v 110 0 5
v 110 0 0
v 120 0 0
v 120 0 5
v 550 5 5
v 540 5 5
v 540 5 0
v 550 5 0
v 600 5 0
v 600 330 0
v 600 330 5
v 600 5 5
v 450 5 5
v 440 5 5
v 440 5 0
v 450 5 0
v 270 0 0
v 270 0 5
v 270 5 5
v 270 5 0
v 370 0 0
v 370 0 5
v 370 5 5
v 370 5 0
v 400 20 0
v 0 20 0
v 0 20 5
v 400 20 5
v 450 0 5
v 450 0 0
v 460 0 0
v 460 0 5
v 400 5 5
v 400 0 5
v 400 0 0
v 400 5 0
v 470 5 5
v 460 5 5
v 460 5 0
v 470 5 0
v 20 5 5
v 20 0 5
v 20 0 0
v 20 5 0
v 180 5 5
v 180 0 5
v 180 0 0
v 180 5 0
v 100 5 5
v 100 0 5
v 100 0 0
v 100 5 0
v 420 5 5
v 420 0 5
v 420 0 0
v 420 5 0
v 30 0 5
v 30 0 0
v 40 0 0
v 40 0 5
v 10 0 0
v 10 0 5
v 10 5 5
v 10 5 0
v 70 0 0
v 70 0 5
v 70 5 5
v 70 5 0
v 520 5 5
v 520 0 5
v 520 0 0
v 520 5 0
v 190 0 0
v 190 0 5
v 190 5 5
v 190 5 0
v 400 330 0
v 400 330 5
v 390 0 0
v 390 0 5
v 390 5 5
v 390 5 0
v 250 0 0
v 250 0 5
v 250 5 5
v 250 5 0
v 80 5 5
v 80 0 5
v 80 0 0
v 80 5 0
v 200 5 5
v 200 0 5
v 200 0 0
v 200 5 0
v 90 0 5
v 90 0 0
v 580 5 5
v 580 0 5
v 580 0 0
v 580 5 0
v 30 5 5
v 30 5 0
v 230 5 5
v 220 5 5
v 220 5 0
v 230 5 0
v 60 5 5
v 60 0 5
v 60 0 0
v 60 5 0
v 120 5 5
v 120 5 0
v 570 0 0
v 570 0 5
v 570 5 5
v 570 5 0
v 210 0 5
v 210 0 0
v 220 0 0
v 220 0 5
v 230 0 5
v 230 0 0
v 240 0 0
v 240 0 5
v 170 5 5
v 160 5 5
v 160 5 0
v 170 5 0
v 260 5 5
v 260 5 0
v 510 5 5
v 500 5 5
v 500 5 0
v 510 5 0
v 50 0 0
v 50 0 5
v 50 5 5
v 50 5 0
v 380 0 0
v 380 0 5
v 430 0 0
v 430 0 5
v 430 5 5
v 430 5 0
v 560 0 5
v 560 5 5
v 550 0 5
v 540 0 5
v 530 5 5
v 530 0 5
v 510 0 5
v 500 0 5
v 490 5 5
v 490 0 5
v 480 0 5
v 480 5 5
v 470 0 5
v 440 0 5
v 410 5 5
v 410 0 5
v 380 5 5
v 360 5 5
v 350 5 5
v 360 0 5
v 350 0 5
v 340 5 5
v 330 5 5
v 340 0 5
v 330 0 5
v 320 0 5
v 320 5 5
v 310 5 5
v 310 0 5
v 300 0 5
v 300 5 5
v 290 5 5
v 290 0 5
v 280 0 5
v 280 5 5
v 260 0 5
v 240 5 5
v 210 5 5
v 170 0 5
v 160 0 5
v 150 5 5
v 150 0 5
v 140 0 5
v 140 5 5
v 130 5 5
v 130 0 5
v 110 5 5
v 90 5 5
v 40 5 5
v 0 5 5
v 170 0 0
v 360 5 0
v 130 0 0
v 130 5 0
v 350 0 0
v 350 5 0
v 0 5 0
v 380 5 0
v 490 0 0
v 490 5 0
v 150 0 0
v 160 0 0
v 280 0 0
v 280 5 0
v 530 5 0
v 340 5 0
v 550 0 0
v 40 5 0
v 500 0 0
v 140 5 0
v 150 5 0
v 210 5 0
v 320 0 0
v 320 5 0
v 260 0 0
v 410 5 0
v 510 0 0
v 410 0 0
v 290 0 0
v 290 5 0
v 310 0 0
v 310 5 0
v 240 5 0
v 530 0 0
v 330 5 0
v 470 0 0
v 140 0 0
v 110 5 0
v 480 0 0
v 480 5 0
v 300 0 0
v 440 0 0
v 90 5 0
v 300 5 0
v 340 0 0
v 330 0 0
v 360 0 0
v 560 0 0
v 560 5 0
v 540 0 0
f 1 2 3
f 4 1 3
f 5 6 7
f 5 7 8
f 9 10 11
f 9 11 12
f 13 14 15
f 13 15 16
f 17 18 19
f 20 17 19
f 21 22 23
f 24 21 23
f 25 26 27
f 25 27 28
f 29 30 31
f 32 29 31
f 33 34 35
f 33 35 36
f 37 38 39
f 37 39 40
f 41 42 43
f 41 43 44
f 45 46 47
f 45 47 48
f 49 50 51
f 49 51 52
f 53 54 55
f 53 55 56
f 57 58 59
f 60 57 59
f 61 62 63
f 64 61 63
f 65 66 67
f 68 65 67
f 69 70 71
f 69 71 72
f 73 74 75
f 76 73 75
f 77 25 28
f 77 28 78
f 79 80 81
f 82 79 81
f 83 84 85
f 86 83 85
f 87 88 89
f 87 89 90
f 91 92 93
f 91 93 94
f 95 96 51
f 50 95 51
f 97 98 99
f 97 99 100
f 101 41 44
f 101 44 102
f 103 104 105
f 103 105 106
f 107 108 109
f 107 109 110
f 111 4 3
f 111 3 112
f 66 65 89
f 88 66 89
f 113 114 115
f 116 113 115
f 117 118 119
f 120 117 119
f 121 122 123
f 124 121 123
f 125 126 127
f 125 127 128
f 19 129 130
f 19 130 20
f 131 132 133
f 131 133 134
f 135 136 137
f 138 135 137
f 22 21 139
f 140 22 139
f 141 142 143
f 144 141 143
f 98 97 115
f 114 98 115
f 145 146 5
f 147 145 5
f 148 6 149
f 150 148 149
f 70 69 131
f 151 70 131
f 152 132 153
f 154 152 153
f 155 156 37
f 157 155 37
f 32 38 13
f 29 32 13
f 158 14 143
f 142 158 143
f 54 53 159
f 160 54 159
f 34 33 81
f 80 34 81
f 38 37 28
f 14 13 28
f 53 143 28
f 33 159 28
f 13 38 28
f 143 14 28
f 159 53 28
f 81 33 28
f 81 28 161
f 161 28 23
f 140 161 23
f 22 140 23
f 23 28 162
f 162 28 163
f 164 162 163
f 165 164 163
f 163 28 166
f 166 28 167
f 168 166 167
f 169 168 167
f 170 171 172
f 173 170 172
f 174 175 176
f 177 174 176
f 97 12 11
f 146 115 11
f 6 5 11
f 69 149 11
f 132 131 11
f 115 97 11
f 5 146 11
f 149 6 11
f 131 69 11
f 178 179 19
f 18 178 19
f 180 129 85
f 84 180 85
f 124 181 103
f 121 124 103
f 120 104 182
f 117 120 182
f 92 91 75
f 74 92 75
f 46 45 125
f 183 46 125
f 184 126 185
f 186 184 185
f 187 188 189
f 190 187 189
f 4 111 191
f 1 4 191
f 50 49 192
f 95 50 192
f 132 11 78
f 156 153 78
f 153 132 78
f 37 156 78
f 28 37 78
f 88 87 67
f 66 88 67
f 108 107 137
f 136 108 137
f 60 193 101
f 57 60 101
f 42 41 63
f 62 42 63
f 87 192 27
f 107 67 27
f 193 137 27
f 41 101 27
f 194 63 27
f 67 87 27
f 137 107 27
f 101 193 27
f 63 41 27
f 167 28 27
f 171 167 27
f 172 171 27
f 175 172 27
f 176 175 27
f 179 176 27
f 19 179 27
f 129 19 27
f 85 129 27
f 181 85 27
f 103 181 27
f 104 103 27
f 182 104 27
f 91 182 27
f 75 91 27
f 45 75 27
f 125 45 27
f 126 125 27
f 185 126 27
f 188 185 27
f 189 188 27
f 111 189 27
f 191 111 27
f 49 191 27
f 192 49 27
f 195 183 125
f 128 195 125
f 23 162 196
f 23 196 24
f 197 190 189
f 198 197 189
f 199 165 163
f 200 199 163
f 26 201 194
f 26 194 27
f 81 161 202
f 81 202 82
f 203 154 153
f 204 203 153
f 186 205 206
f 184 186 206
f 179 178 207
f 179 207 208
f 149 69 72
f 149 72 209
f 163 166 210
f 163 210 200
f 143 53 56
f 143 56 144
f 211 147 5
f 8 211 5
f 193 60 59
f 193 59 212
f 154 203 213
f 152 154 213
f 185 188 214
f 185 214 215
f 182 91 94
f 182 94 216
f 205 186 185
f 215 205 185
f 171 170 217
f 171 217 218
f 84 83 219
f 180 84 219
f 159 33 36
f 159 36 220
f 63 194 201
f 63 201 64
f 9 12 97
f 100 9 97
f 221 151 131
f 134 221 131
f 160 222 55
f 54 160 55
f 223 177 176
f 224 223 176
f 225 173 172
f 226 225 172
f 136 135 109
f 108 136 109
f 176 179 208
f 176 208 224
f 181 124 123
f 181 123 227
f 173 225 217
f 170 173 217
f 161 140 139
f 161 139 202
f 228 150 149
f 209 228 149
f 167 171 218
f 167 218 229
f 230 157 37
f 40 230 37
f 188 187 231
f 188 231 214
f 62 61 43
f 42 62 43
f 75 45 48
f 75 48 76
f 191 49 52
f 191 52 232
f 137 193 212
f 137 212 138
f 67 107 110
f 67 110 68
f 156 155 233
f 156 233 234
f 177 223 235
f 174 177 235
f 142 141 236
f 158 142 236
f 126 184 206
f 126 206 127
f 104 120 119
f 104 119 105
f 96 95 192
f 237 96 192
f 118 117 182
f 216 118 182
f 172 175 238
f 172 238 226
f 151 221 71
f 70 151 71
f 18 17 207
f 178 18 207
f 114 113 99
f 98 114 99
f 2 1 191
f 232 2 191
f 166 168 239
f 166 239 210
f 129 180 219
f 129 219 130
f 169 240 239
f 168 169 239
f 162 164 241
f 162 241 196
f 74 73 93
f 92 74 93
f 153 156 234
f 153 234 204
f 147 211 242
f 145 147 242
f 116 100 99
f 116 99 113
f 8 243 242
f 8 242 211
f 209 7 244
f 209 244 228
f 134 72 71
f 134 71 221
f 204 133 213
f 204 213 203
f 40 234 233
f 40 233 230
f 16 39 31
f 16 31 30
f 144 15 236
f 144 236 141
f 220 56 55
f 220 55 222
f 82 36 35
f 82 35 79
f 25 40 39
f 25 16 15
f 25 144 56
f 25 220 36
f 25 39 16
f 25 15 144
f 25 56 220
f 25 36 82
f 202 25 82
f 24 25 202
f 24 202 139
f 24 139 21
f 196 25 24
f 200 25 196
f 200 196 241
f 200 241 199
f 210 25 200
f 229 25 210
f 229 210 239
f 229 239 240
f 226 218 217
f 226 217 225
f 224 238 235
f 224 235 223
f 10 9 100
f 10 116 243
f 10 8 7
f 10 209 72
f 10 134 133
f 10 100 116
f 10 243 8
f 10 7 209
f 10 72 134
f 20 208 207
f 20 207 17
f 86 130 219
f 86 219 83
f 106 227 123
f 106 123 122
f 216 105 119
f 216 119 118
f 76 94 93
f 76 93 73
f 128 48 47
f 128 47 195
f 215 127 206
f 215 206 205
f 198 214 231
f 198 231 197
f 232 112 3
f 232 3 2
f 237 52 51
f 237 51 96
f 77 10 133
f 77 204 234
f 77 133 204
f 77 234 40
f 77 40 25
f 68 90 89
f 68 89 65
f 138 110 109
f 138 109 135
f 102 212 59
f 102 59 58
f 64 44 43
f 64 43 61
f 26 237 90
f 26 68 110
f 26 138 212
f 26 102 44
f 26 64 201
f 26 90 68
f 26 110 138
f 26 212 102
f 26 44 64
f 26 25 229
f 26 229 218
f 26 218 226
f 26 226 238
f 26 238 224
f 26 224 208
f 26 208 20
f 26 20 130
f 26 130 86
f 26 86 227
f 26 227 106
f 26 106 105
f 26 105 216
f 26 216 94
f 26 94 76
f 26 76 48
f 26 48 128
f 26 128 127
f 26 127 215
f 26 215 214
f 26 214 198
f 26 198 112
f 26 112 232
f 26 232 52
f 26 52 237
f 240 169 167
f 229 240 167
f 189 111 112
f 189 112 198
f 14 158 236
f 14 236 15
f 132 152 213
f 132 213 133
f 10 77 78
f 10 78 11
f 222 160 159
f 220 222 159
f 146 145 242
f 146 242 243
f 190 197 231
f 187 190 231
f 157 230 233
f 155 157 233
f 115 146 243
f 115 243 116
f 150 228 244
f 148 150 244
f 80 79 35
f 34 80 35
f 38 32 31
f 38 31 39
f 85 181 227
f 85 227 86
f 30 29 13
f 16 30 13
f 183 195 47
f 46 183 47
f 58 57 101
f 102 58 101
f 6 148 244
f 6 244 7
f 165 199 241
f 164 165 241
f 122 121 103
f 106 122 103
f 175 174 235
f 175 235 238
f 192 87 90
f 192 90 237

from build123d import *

# Parameters (mm, degrees)
BOSS_EXTRU_1_DEPTH      = 5
ESQUISSE2_W             = 10
ESQUISSE2_H             = 5
ENL_V_MAT_EXTRU_2_DEPTH = 685.780986886


with BuildPart() as part:
    # Esquisse1 → Boss.-Extru.1 (new body)
    with BuildSketch(Plane.XY):
        Polygon((400, 20), (400, 330), (600, 330), (600, 0), (400, 0), (0, 0), (0, 20), align=None)
    extrude(amount=BOSS_EXTRU_1_DEPTH)

    # Esquisse2 → Enlèv. mat.-Extru.2 (cut, through all)
    with BuildSketch(Plane.XY.offset(5)):
        with Locations((25, 2.5)):
            Rectangle(ESQUISSE2_W, ESQUISSE2_H)
        with Locations((5, 2.5)):
            Rectangle(ESQUISSE2_W, ESQUISSE2_H)
        with Locations((45, 2.5)):
            Rectangle(ESQUISSE2_W, ESQUISSE2_H)
        with Locations((65, 2.5)):
            Rectangle(ESQUISSE2_W, ESQUISSE2_H)
        with Locations((85, 2.5)):
            Rectangle(ESQUISSE2_W, ESQUISSE2_H)
        with Locations((105, 2.5)):
            Rectangle(ESQUISSE2_W, ESQUISSE2_H)
        with Locations((125, 2.5)):
            Rectangle(ESQUISSE2_W, ESQUISSE2_H)
        with Locations((145, 2.5)):
            Rectangle(ESQUISSE2_W, ESQUISSE2_H)
        with Locations((165, 2.5)):
            Rectangle(ESQUISSE2_W, ESQUISSE2_H)
        with Locations((185, 2.5)):
            Rectangle(ESQUISSE2_W, ESQUISSE2_H)
        with Locations((205, 2.5)):
            Rectangle(ESQUISSE2_W, ESQUISSE2_H)
        with Locations((225, 2.5)):
            Rectangle(ESQUISSE2_W, ESQUISSE2_H)
        with Locations((245, 2.5)):
            Rectangle(ESQUISSE2_W, ESQUISSE2_H)
        with Locations((265, 2.5)):
            Rectangle(ESQUISSE2_W, ESQUISSE2_H)
        with Locations((285, 2.5)):
            Rectangle(ESQUISSE2_W, ESQUISSE2_H)
        with Locations((305, 2.5)):
            Rectangle(ESQUISSE2_W, ESQUISSE2_H)
        with Locations((325, 2.5)):
            Rectangle(ESQUISSE2_W, ESQUISSE2_H)
        with Locations((345, 2.5)):
            Rectangle(ESQUISSE2_W, ESQUISSE2_H)
        with Locations((365, 2.5)):
            Rectangle(ESQUISSE2_W, ESQUISSE2_H)
        with Locations((385, 2.5)):
            Rectangle(ESQUISSE2_W, ESQUISSE2_H)
        with Locations((405, 2.5)):
            Rectangle(ESQUISSE2_W, ESQUISSE2_H)
        with Locations((425, 2.5)):
            Rectangle(ESQUISSE2_W, ESQUISSE2_H)
        with Locations((445, 2.5)):
            Rectangle(ESQUISSE2_W, ESQUISSE2_H)
        with Locations((465, 2.5)):
            Rectangle(ESQUISSE2_W, ESQUISSE2_H)
        with Locations((485, 2.5)):
            Rectangle(ESQUISSE2_W, ESQUISSE2_H)
        with Locations((505, 2.5)):
            Rectangle(ESQUISSE2_W, ESQUISSE2_H)
        with Locations((525, 2.5)):
            Rectangle(ESQUISSE2_W, ESQUISSE2_H)
        with Locations((545, 2.5)):
            Rectangle(ESQUISSE2_W, ESQUISSE2_H)
        with Locations((565, 2.5)):
            Rectangle(ESQUISSE2_W, ESQUISSE2_H)
        Polygon((580, 0), (580, 5), (590, 5), (600, 5), (600, 0), (590, 0), align=None)
    extrude(amount=-ENL_V_MAT_EXTRU_2_DEPTH, mode=Mode.SUBTRACT)


solid = part.part
